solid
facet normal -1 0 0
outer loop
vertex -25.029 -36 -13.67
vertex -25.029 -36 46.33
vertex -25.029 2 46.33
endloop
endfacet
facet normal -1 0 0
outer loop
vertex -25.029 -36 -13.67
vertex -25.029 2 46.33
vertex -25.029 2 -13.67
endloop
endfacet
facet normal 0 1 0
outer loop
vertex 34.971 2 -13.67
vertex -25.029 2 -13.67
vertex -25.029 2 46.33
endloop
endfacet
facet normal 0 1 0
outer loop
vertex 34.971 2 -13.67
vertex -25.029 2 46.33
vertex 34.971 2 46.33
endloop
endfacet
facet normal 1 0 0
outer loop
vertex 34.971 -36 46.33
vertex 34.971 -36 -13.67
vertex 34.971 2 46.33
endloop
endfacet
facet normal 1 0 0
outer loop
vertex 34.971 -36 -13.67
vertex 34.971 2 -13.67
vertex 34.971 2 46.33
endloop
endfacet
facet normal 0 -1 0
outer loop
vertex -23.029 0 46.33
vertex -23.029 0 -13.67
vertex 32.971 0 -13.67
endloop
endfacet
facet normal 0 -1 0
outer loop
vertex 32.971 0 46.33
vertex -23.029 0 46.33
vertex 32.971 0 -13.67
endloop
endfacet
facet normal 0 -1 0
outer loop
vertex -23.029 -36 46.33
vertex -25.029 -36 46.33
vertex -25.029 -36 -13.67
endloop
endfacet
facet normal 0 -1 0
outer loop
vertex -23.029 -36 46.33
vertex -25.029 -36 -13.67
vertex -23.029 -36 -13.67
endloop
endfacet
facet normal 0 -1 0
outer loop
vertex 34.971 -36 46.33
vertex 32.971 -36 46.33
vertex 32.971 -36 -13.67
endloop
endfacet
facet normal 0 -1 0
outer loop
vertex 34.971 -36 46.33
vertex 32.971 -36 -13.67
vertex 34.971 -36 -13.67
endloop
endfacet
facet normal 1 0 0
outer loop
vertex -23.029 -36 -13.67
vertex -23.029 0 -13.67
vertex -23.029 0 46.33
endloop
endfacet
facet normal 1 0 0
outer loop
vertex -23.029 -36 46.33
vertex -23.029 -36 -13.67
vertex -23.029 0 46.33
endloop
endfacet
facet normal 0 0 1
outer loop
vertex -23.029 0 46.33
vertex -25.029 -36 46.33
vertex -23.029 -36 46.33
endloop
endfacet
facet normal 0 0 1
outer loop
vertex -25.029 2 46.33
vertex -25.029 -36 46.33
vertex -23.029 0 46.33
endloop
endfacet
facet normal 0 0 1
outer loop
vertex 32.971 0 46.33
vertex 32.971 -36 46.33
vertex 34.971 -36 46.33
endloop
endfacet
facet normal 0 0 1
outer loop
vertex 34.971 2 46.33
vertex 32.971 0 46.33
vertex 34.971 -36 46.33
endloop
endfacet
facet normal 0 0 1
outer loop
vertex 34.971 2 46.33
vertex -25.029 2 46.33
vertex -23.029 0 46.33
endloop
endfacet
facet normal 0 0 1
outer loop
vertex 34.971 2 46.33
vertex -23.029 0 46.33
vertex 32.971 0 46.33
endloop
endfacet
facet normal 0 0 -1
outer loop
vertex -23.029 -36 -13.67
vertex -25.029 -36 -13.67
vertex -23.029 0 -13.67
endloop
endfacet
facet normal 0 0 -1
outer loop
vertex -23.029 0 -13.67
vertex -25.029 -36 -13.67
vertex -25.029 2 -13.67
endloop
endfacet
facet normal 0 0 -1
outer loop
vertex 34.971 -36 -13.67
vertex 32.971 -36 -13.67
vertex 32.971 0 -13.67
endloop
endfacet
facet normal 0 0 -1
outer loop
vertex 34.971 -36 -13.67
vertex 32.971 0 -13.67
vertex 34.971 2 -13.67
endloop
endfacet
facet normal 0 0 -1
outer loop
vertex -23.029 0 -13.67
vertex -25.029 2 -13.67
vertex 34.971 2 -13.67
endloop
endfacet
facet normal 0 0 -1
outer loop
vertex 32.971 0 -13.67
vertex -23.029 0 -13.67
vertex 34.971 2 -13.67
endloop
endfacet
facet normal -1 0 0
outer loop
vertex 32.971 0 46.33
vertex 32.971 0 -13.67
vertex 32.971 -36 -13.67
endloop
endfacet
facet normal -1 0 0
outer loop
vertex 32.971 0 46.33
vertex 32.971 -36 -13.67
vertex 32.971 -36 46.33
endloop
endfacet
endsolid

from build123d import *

# Parameters (mm, degrees)
SKETCH1_W           = 60
SKETCH1_H           = 60
BOSS_EXTRUDE1_DEPTH = 2
SKETCH2_W           = 2
SKETCH2_H           = 60
BOSS_EXTRUDE2_DEPTH = 36


with BuildPart() as part:
    # Sketch1 → Boss-Extrude1 (new body)
    with BuildSketch(Plane(origin=(0, 0, 0), x_dir=(1, 0, 0), z_dir=(0, 1, 0))):
        with Locations((4.971289332, -16.330275229)):
            Rectangle(SKETCH1_W, SKETCH1_H)
    extrude(amount=BOSS_EXTRUDE1_DEPTH)

    # Sketch2 → Boss-Extrude2 (add)
    with BuildSketch(Plane.XZ):
        with Locations((33.971289332, 16.330275229)):
            Rectangle(SKETCH2_W, SKETCH2_H)
        with Locations((-24.028710668, 16.330275229)):
            Rectangle(SKETCH2_W, SKETCH2_H)
    extrude(amount=BOSS_EXTRUDE2_DEPTH)


solid = part.part
